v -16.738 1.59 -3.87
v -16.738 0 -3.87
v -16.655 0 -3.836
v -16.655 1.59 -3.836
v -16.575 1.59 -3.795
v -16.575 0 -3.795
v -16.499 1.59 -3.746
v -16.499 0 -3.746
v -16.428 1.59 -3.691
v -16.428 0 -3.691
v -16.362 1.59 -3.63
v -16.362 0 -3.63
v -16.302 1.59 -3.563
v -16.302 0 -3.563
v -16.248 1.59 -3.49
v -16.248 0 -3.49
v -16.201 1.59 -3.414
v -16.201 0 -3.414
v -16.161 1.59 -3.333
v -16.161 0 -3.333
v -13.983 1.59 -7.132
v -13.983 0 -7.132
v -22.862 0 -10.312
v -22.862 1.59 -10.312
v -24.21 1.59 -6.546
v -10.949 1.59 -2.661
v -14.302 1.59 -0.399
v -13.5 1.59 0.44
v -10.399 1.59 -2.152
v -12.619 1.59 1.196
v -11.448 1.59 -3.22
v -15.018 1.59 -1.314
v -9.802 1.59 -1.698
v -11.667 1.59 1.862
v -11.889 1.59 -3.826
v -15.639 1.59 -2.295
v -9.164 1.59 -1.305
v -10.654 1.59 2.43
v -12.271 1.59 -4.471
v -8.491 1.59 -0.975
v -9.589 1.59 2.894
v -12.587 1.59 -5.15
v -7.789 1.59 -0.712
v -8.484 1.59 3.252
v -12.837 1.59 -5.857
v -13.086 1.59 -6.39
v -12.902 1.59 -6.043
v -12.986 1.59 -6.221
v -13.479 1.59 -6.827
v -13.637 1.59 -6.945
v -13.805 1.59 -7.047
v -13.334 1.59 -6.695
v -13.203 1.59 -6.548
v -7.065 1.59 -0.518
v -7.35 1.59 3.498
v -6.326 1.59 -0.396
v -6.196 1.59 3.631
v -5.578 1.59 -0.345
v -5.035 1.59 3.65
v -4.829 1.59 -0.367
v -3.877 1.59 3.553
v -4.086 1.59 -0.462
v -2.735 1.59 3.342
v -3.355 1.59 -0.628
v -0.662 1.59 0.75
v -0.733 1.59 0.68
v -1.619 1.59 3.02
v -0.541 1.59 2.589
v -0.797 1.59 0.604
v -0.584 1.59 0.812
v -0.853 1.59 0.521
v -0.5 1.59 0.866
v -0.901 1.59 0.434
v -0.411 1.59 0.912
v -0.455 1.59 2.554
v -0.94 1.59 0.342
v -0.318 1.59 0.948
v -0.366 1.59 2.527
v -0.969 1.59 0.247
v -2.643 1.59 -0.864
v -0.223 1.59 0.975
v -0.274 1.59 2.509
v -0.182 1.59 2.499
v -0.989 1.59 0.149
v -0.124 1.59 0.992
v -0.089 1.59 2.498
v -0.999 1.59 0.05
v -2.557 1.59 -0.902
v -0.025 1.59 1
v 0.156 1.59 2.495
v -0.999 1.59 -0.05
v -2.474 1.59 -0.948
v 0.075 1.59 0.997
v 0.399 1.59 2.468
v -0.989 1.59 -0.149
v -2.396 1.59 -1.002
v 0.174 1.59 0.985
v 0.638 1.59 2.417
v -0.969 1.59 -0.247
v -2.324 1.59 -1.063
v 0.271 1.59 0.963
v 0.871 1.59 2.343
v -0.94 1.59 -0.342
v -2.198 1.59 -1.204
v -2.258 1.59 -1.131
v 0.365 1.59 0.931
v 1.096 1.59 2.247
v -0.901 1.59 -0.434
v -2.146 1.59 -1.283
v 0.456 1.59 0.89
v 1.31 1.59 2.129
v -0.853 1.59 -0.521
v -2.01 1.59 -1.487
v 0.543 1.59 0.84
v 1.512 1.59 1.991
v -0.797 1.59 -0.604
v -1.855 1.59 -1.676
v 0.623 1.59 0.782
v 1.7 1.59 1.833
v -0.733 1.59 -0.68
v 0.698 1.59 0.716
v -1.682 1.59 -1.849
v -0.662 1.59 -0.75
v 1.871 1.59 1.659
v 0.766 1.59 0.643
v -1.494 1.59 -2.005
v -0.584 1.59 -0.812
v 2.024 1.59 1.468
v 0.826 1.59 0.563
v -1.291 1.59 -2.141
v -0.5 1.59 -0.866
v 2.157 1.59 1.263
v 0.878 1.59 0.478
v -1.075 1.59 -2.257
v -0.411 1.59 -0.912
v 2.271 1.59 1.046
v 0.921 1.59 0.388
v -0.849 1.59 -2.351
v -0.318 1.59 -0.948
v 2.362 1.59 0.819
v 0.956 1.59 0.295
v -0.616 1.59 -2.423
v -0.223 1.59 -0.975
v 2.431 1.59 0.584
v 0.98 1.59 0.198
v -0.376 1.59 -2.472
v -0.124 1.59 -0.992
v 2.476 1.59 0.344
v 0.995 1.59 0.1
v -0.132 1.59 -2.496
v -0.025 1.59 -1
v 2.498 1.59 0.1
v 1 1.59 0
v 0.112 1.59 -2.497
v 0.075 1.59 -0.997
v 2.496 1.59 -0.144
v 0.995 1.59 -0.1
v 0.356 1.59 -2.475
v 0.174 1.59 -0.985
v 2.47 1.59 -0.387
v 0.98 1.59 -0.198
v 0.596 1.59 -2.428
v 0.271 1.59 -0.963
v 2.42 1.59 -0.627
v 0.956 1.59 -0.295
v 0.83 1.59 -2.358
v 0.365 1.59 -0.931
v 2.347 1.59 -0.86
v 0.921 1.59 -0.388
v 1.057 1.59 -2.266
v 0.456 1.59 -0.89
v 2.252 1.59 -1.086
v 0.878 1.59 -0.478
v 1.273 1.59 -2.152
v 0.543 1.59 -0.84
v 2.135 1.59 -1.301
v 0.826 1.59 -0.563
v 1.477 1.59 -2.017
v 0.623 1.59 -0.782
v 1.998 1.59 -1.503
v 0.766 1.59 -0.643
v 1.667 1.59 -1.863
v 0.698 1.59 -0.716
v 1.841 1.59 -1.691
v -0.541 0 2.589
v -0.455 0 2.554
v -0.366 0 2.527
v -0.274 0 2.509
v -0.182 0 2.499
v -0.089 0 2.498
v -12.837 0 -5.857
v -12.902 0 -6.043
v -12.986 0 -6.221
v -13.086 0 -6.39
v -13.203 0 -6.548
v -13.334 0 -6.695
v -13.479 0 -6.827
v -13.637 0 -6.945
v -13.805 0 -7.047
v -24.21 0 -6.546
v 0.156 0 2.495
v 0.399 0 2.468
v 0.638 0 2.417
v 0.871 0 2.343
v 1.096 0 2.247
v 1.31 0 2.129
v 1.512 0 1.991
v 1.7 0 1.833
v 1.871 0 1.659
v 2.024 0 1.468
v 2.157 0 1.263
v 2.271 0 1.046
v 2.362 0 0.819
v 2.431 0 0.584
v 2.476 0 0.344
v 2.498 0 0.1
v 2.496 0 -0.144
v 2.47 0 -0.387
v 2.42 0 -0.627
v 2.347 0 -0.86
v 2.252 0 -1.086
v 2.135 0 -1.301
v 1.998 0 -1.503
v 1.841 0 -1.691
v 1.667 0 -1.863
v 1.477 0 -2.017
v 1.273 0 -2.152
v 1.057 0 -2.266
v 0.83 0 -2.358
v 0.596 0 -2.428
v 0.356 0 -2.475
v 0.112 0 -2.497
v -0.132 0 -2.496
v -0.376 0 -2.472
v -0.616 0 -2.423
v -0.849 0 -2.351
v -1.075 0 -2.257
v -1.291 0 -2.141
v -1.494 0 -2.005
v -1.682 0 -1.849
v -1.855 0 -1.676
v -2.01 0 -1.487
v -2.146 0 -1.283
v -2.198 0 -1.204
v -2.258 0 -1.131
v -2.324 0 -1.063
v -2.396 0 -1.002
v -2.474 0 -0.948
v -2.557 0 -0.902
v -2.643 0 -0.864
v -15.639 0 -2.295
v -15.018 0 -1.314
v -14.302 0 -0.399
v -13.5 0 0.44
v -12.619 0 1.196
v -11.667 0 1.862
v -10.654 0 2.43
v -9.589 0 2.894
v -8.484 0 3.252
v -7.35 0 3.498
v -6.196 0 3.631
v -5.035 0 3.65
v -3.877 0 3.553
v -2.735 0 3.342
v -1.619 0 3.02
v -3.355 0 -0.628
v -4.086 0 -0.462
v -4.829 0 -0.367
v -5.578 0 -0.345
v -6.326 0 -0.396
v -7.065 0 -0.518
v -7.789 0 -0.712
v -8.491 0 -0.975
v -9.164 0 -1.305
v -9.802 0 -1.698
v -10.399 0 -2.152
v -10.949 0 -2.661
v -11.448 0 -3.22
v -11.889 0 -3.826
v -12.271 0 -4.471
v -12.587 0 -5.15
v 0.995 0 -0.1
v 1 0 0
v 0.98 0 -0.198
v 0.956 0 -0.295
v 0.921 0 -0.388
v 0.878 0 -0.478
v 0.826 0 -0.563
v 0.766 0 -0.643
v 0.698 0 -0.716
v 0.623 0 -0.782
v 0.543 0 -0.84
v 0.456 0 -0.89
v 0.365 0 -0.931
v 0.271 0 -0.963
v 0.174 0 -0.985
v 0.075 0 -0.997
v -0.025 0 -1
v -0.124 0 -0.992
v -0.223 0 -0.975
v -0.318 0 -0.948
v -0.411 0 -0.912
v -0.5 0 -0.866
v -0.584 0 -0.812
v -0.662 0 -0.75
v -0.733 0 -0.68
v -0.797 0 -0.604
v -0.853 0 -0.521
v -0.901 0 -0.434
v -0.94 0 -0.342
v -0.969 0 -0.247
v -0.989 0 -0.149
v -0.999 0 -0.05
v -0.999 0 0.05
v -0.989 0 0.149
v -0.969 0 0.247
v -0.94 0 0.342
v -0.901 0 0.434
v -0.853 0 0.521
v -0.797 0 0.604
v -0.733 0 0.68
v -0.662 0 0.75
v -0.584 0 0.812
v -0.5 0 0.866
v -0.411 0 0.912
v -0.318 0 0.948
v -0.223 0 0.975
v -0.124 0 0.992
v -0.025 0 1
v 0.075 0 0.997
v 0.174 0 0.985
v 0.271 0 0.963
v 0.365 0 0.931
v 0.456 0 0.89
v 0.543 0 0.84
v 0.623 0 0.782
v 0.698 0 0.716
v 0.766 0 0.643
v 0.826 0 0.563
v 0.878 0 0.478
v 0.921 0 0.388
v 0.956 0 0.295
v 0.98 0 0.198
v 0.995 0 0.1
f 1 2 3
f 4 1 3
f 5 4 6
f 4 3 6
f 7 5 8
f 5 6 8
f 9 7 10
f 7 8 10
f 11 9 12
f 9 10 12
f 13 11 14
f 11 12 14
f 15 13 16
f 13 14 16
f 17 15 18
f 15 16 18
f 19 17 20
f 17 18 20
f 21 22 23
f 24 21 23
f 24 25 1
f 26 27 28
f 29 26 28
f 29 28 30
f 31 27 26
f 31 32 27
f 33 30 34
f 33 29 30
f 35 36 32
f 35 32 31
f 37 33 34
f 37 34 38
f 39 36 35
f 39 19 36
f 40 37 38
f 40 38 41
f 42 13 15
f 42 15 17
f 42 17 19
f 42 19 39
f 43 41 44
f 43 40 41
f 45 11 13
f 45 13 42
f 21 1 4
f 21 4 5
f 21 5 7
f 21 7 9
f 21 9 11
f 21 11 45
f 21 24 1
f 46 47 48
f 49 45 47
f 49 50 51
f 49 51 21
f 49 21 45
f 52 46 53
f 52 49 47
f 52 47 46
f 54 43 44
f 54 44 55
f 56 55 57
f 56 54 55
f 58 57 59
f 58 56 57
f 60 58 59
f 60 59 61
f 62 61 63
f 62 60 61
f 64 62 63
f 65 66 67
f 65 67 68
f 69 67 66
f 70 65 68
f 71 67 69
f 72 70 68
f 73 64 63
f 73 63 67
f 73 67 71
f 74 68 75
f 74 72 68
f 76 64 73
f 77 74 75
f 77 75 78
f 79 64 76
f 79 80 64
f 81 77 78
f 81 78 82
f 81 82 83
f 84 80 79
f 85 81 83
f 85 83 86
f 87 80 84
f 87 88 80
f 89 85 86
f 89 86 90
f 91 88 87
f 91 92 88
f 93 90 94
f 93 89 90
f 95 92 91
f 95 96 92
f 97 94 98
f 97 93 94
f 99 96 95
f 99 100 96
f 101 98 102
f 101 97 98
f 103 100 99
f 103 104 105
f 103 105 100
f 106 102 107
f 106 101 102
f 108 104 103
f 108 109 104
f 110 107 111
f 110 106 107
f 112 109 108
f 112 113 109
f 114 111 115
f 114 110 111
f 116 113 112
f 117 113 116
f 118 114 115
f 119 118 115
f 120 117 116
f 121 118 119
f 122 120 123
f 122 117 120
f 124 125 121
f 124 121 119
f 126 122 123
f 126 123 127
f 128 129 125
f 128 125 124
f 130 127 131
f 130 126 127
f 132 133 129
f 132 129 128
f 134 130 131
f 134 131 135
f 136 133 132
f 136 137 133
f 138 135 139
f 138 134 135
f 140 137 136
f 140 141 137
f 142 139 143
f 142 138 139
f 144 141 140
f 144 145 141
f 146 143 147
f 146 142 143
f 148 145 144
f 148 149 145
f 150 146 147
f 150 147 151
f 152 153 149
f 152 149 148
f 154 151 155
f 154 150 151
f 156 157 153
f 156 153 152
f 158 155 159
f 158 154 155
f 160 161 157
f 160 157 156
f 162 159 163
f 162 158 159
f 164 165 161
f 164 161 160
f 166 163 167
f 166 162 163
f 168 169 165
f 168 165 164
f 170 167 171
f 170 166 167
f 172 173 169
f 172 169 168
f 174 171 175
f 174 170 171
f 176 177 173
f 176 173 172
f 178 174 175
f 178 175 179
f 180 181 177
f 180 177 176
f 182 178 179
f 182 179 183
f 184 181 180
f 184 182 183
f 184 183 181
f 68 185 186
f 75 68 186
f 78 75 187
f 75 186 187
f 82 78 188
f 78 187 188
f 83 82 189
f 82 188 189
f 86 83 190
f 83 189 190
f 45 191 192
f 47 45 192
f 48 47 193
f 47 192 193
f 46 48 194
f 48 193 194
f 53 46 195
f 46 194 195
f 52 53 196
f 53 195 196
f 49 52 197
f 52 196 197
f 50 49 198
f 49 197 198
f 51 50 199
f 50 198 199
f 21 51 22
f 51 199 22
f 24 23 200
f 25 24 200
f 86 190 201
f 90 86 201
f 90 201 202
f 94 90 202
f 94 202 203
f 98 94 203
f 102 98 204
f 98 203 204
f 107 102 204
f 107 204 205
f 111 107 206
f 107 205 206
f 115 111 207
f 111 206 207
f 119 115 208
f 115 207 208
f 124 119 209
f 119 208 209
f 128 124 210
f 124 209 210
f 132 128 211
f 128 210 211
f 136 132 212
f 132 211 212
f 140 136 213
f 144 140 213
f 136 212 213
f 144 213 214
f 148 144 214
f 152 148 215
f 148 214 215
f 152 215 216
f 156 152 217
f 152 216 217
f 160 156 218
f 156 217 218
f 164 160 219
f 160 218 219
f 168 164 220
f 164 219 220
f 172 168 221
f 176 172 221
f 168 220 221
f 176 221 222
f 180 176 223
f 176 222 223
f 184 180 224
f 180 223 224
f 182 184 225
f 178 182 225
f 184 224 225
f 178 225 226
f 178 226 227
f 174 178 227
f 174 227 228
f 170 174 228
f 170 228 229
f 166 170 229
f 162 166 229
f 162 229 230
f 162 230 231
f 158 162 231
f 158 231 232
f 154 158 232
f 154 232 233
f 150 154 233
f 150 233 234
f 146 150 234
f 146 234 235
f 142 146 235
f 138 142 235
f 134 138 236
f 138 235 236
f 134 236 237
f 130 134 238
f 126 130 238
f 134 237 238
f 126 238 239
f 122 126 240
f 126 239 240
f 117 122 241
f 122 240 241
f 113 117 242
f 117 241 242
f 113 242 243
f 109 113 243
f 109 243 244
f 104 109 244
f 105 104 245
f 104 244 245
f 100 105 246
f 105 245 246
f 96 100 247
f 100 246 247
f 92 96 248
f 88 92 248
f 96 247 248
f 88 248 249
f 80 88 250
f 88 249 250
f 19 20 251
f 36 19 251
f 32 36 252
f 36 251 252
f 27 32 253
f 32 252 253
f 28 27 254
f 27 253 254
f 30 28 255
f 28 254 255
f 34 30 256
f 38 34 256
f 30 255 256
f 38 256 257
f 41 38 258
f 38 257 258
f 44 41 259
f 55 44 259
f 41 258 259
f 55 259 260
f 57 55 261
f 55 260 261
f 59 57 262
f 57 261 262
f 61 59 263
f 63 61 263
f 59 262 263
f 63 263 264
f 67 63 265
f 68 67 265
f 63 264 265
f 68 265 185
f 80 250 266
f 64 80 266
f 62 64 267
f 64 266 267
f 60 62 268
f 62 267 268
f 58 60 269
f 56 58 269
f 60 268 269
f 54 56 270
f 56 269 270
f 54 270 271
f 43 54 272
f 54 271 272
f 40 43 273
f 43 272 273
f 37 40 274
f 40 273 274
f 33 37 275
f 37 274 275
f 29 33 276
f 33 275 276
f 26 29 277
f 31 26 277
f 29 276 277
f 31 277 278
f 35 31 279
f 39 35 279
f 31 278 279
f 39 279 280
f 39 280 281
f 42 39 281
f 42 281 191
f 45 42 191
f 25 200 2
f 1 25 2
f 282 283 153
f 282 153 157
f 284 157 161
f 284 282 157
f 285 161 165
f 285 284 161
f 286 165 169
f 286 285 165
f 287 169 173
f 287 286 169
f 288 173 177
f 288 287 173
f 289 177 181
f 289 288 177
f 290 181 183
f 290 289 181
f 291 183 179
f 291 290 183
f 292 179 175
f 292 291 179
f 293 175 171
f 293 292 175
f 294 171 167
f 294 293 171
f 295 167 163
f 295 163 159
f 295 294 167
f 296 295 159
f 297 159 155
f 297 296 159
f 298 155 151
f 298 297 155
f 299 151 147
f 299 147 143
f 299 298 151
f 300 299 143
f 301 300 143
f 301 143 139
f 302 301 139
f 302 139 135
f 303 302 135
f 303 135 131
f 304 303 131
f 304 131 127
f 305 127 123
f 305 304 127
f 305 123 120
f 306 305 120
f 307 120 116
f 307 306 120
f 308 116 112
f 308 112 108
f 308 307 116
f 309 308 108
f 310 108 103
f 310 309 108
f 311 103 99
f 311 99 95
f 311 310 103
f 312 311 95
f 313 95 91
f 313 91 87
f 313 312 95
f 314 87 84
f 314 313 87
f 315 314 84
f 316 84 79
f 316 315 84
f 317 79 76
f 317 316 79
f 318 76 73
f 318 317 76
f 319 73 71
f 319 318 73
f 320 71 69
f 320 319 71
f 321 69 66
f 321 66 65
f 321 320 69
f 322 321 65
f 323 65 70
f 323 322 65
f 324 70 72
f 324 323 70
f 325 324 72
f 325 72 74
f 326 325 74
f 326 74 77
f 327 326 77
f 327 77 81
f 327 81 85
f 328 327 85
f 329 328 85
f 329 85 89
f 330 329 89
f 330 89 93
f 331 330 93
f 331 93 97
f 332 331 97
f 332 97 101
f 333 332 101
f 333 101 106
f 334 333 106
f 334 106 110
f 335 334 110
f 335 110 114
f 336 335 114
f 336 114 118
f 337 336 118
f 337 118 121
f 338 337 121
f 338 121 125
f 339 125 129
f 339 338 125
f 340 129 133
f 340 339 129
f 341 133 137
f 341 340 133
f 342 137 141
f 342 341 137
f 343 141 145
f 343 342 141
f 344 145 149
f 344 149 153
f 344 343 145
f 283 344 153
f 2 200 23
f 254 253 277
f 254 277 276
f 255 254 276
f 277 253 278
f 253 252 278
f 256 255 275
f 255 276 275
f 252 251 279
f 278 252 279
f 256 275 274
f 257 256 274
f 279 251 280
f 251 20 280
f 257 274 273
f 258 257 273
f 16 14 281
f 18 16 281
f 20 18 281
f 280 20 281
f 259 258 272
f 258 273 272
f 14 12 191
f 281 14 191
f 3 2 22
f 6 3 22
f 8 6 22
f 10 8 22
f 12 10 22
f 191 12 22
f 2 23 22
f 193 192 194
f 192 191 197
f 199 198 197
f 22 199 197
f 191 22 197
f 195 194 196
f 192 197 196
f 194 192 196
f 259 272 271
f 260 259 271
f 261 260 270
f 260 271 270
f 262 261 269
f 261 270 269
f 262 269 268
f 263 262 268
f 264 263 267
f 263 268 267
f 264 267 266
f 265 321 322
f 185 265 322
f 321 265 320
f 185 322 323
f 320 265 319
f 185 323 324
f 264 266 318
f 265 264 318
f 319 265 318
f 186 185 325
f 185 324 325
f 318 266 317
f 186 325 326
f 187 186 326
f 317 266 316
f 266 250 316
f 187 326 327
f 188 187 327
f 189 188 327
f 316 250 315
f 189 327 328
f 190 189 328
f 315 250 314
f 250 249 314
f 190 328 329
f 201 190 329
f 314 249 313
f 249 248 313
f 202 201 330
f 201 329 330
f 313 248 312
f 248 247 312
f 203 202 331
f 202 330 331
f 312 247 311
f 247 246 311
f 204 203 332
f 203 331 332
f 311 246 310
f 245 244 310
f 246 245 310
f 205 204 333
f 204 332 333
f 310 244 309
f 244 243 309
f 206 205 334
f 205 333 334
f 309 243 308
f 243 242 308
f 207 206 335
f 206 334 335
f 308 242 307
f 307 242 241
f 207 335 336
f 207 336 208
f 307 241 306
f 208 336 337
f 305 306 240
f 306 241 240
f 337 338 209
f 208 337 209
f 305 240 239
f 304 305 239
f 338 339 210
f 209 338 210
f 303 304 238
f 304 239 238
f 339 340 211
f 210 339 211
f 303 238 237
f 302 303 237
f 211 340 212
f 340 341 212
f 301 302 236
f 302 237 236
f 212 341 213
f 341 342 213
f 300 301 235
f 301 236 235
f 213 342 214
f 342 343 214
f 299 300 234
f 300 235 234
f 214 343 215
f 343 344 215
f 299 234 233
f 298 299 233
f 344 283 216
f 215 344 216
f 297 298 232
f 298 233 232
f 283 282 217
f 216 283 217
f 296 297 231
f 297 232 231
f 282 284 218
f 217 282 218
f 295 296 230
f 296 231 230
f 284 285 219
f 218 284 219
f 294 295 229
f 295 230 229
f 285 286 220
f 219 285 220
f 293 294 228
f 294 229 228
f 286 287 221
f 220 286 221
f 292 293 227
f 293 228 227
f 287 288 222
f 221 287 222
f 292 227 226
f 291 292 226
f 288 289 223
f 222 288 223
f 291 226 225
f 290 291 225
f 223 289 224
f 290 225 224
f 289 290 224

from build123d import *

# Parameters (mm, degrees)
SKETCH1_R           = 1
BOSS_EXTRUDE1_DEPTH = 1.59


with BuildPart() as part:
    # Sketch1 → Boss-Extrude1 (new body)
    with BuildSketch(Plane(origin=(0, 0, 0), x_dir=(1, 0, 0), z_dir=(0, 1, 0))):
        with BuildLine():
            Line((-13.982567653, 7.132116323), (-22.861764958, 10.312114381))
            Line((-22.861764958, 10.312114381), (-24.21044114, 6.546337894))
            Line((-24.21044114, 6.546337894), (-16.738208265, 3.870230446))
            ThreePointArc((-16.738208265, 3.870230446), (-16.394250173, 3.660951485), (-16.160706095, 3.332984998))
            ThreePointArc((-16.160706095, 3.332984998), (-9.589384902, -2.894483489), (-0.541170736, -2.5887935))
            ThreePointArc((-0.541170736, -2.5887935), (-0.320283974, -2.517169363), (-0.088833144, -2.498421236))
            ThreePointArc((-0.088833144, -2.498421236), (2.19617582, 1.194492264), (-2.145600439, 1.283120709))
            ThreePointArc((-2.145600439, 1.283120709), (-2.359359709, 1.03174859), (-2.643290683, 0.863629079))
            ThreePointArc((-2.643290683, 0.863629079), (-8.831767295, 1.131940065), (-12.836874427, 5.857228461))
            ThreePointArc((-12.836874427, 5.857228461), (-13.266784954, 6.623123616), (-13.982567653, 7.132116323))
        make_face()
        Circle(SKETCH1_R, mode=Mode.SUBTRACT)
    extrude(amount=BOSS_EXTRUDE1_DEPTH)


solid = part.part
